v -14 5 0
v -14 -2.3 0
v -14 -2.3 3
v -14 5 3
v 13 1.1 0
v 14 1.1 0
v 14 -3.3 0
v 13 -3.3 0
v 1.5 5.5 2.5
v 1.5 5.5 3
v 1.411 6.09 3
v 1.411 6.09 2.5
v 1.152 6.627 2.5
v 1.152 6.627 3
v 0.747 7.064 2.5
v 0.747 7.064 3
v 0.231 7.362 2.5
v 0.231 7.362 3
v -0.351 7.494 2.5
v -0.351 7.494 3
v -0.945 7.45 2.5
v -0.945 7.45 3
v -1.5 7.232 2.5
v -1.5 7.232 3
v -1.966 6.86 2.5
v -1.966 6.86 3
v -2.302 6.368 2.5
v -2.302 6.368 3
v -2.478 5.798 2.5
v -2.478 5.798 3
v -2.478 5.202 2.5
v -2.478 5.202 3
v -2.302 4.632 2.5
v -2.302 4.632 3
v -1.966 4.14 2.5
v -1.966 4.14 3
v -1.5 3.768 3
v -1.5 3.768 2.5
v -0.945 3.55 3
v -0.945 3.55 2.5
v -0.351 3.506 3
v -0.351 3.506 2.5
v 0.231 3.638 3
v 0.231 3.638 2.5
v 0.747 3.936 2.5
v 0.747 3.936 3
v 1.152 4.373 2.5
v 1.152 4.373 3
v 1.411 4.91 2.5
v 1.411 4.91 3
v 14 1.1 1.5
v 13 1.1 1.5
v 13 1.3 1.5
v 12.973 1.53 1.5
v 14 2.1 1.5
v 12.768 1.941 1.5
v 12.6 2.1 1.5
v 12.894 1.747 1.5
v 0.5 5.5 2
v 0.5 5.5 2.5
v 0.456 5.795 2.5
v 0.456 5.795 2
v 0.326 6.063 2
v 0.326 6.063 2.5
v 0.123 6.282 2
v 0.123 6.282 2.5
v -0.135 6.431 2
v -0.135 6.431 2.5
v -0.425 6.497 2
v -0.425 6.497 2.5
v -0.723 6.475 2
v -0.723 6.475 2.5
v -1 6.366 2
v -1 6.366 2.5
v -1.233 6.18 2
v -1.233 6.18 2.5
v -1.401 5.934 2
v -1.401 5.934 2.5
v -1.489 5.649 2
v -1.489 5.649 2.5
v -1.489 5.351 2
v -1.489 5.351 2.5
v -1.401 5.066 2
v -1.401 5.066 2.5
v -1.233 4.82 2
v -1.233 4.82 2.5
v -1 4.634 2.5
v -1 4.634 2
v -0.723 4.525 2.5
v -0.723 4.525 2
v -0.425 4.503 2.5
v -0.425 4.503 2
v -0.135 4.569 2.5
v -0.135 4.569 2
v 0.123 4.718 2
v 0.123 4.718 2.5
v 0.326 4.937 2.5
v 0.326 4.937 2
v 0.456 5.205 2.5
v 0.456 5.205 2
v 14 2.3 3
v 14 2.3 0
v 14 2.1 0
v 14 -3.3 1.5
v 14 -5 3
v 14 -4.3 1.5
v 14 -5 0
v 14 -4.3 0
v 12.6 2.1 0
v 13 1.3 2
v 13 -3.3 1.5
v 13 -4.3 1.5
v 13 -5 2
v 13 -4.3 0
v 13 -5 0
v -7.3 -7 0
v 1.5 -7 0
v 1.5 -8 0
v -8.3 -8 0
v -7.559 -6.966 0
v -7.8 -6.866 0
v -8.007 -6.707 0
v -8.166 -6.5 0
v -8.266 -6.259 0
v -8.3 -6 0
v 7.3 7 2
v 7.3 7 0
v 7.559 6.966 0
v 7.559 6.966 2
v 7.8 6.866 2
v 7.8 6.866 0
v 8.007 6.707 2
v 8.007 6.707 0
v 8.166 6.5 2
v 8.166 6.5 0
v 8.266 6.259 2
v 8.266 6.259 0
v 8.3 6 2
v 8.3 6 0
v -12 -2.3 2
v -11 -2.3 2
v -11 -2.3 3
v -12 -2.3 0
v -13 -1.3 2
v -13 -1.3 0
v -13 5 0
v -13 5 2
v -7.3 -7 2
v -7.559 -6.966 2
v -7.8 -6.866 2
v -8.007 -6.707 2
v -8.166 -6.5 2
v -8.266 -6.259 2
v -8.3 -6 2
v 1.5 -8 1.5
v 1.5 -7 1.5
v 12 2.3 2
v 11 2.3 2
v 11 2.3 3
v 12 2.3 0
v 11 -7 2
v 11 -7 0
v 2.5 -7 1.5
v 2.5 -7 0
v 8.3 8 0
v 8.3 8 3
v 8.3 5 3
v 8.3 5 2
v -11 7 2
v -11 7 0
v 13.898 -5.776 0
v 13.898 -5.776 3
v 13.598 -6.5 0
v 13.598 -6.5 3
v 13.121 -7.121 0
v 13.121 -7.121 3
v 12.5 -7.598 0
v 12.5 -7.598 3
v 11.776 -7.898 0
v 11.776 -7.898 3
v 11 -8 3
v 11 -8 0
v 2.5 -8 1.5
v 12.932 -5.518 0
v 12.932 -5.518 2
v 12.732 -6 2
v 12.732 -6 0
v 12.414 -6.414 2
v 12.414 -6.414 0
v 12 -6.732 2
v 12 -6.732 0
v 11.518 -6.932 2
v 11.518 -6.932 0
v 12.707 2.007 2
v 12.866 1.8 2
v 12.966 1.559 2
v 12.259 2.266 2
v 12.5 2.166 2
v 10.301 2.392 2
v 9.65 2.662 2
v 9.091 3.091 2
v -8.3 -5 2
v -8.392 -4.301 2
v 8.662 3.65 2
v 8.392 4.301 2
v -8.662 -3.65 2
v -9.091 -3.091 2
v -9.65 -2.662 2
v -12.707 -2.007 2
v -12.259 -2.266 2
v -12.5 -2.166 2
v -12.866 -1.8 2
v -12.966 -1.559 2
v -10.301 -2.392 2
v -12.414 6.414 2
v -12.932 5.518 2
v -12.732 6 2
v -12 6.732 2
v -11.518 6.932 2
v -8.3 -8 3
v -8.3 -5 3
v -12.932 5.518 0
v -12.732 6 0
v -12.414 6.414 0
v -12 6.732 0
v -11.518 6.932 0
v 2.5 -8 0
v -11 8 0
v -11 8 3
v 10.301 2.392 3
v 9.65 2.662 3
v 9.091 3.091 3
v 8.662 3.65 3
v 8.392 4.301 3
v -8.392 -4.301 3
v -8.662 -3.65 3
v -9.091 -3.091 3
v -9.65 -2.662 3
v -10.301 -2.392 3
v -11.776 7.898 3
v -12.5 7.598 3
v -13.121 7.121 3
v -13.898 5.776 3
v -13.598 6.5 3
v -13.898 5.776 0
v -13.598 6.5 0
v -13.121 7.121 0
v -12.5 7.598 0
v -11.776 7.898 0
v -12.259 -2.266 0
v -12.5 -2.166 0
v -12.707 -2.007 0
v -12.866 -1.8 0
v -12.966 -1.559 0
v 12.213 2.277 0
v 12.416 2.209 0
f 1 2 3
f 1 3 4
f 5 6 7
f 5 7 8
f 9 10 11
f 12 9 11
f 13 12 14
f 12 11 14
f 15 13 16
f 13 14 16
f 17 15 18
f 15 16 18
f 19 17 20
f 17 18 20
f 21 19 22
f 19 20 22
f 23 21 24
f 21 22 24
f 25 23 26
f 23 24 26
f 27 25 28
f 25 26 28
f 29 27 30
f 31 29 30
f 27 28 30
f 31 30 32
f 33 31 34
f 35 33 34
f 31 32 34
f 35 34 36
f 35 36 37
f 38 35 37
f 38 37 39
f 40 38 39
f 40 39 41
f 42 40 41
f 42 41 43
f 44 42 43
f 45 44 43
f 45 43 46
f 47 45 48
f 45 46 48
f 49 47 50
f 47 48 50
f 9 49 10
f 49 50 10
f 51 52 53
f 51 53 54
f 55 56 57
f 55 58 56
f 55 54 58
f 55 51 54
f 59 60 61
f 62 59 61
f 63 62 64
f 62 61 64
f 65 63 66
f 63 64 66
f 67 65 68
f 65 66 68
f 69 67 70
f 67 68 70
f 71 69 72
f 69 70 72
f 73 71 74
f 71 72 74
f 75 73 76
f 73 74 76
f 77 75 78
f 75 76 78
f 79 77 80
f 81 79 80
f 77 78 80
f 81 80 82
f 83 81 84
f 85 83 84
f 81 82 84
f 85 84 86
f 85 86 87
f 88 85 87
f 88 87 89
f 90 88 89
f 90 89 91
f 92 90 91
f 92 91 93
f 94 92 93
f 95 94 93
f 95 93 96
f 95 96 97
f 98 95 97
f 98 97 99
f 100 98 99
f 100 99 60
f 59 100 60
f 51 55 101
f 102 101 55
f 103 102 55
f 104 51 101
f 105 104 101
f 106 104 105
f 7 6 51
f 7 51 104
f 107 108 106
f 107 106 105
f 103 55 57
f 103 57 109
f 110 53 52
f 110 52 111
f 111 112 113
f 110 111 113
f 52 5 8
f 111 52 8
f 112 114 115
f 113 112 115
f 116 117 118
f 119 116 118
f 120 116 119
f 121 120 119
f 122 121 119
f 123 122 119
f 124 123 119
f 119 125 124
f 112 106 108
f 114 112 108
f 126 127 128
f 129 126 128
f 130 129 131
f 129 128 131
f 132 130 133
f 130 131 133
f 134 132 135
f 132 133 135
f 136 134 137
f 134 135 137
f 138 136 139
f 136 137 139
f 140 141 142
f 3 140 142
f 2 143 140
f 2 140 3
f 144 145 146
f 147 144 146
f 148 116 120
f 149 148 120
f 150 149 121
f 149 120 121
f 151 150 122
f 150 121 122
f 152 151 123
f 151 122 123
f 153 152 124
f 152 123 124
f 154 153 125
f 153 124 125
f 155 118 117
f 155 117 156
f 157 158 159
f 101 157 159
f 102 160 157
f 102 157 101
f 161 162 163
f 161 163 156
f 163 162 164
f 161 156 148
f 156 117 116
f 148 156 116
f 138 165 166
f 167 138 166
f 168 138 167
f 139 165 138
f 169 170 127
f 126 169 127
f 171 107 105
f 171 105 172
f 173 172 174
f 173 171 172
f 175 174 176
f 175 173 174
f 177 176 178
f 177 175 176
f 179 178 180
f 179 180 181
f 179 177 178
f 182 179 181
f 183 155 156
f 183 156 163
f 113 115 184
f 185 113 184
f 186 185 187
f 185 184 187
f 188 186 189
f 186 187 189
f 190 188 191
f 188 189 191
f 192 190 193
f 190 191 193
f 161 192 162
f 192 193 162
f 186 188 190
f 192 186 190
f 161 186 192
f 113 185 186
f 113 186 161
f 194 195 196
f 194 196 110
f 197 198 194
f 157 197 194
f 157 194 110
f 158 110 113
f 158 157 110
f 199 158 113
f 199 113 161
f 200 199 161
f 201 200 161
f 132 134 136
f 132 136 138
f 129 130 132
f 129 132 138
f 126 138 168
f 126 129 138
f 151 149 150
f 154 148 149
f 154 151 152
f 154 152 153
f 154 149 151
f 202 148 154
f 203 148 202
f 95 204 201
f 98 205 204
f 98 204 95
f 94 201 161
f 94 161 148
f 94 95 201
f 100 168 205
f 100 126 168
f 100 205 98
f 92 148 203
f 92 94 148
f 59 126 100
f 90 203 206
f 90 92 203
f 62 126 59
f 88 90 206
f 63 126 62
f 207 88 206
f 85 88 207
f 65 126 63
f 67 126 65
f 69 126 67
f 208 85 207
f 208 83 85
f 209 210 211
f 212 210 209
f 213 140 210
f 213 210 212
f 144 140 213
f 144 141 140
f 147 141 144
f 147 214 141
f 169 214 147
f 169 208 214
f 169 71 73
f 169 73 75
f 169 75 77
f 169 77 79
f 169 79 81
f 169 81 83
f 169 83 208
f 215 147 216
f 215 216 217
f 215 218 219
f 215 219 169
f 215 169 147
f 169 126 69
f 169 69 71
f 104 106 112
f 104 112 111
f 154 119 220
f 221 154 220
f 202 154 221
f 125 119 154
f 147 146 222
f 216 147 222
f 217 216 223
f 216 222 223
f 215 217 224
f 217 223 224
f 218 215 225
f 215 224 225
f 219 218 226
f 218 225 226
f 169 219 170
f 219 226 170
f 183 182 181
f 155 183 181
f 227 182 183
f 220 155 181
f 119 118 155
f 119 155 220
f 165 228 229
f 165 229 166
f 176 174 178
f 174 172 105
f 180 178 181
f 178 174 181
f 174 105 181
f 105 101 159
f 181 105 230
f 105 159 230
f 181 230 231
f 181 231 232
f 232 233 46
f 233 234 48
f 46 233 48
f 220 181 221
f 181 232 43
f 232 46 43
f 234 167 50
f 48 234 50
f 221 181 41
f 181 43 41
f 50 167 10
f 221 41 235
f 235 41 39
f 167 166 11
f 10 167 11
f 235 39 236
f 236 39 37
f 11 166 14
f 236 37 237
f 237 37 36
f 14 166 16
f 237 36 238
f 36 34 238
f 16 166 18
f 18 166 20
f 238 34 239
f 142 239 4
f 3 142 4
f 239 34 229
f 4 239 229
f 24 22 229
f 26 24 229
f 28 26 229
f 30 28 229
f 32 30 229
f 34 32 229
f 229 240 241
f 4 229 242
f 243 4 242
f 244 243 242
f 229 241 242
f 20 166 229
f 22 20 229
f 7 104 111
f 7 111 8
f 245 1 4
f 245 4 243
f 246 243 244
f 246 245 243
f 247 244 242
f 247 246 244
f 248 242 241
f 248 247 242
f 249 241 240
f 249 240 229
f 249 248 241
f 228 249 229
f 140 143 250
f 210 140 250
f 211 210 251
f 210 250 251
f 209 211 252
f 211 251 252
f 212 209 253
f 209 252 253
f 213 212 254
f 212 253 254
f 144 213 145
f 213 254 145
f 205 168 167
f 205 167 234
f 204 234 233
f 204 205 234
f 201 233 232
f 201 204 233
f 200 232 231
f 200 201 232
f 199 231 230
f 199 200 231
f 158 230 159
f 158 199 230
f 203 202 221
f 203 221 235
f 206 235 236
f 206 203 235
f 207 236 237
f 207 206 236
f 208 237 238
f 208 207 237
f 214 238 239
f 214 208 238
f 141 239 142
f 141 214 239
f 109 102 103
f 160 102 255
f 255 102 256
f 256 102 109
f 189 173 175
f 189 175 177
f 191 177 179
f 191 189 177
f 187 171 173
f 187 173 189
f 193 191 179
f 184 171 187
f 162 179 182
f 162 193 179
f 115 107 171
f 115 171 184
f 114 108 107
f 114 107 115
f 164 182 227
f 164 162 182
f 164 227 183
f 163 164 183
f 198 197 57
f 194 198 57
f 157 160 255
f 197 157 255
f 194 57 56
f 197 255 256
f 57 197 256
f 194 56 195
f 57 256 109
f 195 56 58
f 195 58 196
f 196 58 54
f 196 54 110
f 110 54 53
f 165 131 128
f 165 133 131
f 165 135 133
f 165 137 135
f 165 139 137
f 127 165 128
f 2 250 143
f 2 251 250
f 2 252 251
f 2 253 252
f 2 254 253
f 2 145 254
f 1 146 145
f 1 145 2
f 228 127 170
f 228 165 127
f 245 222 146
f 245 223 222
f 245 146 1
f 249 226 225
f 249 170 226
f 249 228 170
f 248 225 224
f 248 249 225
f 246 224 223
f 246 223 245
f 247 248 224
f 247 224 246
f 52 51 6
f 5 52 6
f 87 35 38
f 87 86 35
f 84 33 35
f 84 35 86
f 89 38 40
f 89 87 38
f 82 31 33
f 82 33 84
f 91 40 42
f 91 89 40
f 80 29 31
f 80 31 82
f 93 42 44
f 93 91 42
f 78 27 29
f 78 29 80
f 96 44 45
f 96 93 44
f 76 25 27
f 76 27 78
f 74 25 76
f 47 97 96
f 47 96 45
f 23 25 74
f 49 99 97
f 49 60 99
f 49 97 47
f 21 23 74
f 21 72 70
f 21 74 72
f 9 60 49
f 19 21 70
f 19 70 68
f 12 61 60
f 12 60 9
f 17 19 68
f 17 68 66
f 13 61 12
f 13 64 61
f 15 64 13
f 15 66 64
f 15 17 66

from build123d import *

# Parameters (mm, degrees)
DODANIE_WYCI_GNI_CIE1_DEPTH = 3
WYTNIJ_WYCI_GNI_CIE1_DEPTH  = 2
WYTNIJ_WYCI_GNI_CIE2_REACH  = 30
SZKIC3_W                    = 1.5
SZKIC3_H                    = 1
WYTNIJ_WYCI_GNI_CIE3_REACH  = 18
SZKIC4_W                    = 1
SZKIC4_H                    = 1.5
SZKIC5_R                    = 2
WYTNIJ_WYCI_GNI_CIE4_DEPTH  = 0.5
WYTNIJ_WYCI_GNI_CIE5_REACH  = 4.5
SZKIC6_R                    = 1


with BuildPart() as part:
    # Szkic1 → Dodanie-wyciągnięcie1 (new body)
    with BuildSketch(Plane.XY):
        with BuildLine():
            Line((-11, 8), (8.3, 8))
            Line((8.3, 8), (8.3, 5))
            ThreePointArc((8.3, 5), (9.090811691, 3.090811691), (11, 2.3))
            Line((11, 2.3), (14, 2.3))
            Line((14, 2.3), (14, -5))
            ThreePointArc((14, -5), (13.121320344, -7.121320344), (11, -8))
            Line((11, -8), (-8.3, -8))
            Line((-8.3, -8), (-8.3, -5))
            ThreePointArc((-8.3, -5), (-9.090811691, -3.090811691), (-11, -2.3))
            Line((-11, -2.3), (-14, -2.3))
            Line((-14, -2.3), (-14, 5))
            ThreePointArc((-14, 5), (-13.121320344, 7.121320344), (-11, 8))
        make_face()
    extrude(amount=DODANIE_WYCI_GNI_CIE1_DEPTH)

    # Szkic2 → Wytnij-wyciągnięcie1 (cut)
    with BuildSketch(Plane(origin=(0, 0, 0), x_dir=(-1, 0, 0), z_dir=(0, 0, -1))):
        with BuildLine():
            Line((11, 7), (-7.3, 7))
            ThreePointArc((-7.3, 7), (-8.007106781, 6.707106781), (-8.3, 6))
            Line((-8.3, 6), (-8.3, 5))
            ThreePointArc((-8.3, 5), (-9.090811691, 3.090811691), (-11, 2.3))
            Line((-11, 2.3), (-12, 2.3))
            ThreePointArc((-12, 2.3), (-12.707106781, 2.007106781), (-13, 1.3))
            Line((-13, 1.3), (-13, -5))
            ThreePointArc((-13, -5), (-12.414213562, -6.414213562), (-11, -7))
            Line((-11, -7), (7.3, -7))
            ThreePointArc((7.3, -7), (8.007106781, -6.707106781), (8.3, -6))
            Line((8.3, -6), (8.3, -5))
            ThreePointArc((8.3, -5), (9.090811691, -3.090811691), (11, -2.3))
            Line((11, -2.3), (12, -2.3))
            ThreePointArc((12, -2.3), (12.707106781, -2.007106781), (13, -1.3))
            Line((13, -1.3), (13, 5))
            ThreePointArc((13, 5), (12.414213562, 6.414213562), (11, 7))
        make_face()
    extrude(amount=-WYTNIJ_WYCI_GNI_CIE1_DEPTH, mode=Mode.SUBTRACT)

    # Szkic3 → Wytnij-wyciągnięcie2 (cut, up to next)
    with BuildSketch(Plane(origin=(14, 0, 0), x_dir=(0, 0, -1), z_dir=(1, 0, 0)), mode=Mode.PRIVATE) as wytnij_wyci_gni_cie2_sk1:
        with Locations((-0.75, 1.6)):
            Rectangle(SZKIC3_W, SZKIC3_H)
    wytnij_wyci_gni_cie2_tool1 = extrude(wytnij_wyci_gni_cie2_sk1.sketch, amount=-WYTNIJ_WYCI_GNI_CIE2_REACH, mode=Mode.PRIVATE) & part.part
    add(wytnij_wyci_gni_cie2_tool1.solids().sort_by_distance((14, 1.6, 0.75))[0], mode=Mode.SUBTRACT)
    # Szkic3 → Wytnij-wyciągnięcie2 (cut, up to next)
    with BuildSketch(Plane(origin=(14, 0, 0), x_dir=(0, 0, -1), z_dir=(1, 0, 0)), mode=Mode.PRIVATE) as wytnij_wyci_gni_cie2_sk2:
        with Locations((-0.75, -3.8)):
            Rectangle(SZKIC3_W, SZKIC3_H)
    wytnij_wyci_gni_cie2_tool2 = extrude(wytnij_wyci_gni_cie2_sk2.sketch, amount=-WYTNIJ_WYCI_GNI_CIE2_REACH, mode=Mode.PRIVATE) & part.part
    add(wytnij_wyci_gni_cie2_tool2.solids().sort_by_distance((14, -3.8, 0.75))[0], mode=Mode.SUBTRACT)

    # Szkic4 → Wytnij-wyciągnięcie3 (cut, up to next)
    with BuildSketch(Plane.XZ.offset(8), mode=Mode.PRIVATE) as wytnij_wyci_gni_cie3_sk1:
        with Locations((2, 0.75)):
            Rectangle(SZKIC4_W, SZKIC4_H)
    wytnij_wyci_gni_cie3_tool1 = extrude(wytnij_wyci_gni_cie3_sk1.sketch, amount=-WYTNIJ_WYCI_GNI_CIE3_REACH, mode=Mode.PRIVATE) & part.part
    add(wytnij_wyci_gni_cie3_tool1.solids().sort_by_distance((2, -8, 0.75))[0], mode=Mode.SUBTRACT)

    # Szkic5 → Wytnij-wyciągnięcie4 (cut)
    with BuildSketch(Plane.XY.offset(3)):
        with Locations((-0.5, 5.5)):
            Circle(SZKIC5_R)
    extrude(amount=-WYTNIJ_WYCI_GNI_CIE4_DEPTH, mode=Mode.SUBTRACT)

    # Szkic6 → Wytnij-wyciągnięcie5 (cut, up to next)
    with BuildSketch(Plane.XY.offset(2.5), mode=Mode.PRIVATE) as wytnij_wyci_gni_cie5_sk1:
        with Locations((-0.5, 5.5)):
            Circle(SZKIC6_R)
    wytnij_wyci_gni_cie5_tool1 = extrude(wytnij_wyci_gni_cie5_sk1.sketch, amount=-WYTNIJ_WYCI_GNI_CIE5_REACH, mode=Mode.PRIVATE) & part.part
    add(wytnij_wyci_gni_cie5_tool1.solids().sort_by_distance((-0.5, 5.5, 2.5))[0], mode=Mode.SUBTRACT)


solid = part.part
